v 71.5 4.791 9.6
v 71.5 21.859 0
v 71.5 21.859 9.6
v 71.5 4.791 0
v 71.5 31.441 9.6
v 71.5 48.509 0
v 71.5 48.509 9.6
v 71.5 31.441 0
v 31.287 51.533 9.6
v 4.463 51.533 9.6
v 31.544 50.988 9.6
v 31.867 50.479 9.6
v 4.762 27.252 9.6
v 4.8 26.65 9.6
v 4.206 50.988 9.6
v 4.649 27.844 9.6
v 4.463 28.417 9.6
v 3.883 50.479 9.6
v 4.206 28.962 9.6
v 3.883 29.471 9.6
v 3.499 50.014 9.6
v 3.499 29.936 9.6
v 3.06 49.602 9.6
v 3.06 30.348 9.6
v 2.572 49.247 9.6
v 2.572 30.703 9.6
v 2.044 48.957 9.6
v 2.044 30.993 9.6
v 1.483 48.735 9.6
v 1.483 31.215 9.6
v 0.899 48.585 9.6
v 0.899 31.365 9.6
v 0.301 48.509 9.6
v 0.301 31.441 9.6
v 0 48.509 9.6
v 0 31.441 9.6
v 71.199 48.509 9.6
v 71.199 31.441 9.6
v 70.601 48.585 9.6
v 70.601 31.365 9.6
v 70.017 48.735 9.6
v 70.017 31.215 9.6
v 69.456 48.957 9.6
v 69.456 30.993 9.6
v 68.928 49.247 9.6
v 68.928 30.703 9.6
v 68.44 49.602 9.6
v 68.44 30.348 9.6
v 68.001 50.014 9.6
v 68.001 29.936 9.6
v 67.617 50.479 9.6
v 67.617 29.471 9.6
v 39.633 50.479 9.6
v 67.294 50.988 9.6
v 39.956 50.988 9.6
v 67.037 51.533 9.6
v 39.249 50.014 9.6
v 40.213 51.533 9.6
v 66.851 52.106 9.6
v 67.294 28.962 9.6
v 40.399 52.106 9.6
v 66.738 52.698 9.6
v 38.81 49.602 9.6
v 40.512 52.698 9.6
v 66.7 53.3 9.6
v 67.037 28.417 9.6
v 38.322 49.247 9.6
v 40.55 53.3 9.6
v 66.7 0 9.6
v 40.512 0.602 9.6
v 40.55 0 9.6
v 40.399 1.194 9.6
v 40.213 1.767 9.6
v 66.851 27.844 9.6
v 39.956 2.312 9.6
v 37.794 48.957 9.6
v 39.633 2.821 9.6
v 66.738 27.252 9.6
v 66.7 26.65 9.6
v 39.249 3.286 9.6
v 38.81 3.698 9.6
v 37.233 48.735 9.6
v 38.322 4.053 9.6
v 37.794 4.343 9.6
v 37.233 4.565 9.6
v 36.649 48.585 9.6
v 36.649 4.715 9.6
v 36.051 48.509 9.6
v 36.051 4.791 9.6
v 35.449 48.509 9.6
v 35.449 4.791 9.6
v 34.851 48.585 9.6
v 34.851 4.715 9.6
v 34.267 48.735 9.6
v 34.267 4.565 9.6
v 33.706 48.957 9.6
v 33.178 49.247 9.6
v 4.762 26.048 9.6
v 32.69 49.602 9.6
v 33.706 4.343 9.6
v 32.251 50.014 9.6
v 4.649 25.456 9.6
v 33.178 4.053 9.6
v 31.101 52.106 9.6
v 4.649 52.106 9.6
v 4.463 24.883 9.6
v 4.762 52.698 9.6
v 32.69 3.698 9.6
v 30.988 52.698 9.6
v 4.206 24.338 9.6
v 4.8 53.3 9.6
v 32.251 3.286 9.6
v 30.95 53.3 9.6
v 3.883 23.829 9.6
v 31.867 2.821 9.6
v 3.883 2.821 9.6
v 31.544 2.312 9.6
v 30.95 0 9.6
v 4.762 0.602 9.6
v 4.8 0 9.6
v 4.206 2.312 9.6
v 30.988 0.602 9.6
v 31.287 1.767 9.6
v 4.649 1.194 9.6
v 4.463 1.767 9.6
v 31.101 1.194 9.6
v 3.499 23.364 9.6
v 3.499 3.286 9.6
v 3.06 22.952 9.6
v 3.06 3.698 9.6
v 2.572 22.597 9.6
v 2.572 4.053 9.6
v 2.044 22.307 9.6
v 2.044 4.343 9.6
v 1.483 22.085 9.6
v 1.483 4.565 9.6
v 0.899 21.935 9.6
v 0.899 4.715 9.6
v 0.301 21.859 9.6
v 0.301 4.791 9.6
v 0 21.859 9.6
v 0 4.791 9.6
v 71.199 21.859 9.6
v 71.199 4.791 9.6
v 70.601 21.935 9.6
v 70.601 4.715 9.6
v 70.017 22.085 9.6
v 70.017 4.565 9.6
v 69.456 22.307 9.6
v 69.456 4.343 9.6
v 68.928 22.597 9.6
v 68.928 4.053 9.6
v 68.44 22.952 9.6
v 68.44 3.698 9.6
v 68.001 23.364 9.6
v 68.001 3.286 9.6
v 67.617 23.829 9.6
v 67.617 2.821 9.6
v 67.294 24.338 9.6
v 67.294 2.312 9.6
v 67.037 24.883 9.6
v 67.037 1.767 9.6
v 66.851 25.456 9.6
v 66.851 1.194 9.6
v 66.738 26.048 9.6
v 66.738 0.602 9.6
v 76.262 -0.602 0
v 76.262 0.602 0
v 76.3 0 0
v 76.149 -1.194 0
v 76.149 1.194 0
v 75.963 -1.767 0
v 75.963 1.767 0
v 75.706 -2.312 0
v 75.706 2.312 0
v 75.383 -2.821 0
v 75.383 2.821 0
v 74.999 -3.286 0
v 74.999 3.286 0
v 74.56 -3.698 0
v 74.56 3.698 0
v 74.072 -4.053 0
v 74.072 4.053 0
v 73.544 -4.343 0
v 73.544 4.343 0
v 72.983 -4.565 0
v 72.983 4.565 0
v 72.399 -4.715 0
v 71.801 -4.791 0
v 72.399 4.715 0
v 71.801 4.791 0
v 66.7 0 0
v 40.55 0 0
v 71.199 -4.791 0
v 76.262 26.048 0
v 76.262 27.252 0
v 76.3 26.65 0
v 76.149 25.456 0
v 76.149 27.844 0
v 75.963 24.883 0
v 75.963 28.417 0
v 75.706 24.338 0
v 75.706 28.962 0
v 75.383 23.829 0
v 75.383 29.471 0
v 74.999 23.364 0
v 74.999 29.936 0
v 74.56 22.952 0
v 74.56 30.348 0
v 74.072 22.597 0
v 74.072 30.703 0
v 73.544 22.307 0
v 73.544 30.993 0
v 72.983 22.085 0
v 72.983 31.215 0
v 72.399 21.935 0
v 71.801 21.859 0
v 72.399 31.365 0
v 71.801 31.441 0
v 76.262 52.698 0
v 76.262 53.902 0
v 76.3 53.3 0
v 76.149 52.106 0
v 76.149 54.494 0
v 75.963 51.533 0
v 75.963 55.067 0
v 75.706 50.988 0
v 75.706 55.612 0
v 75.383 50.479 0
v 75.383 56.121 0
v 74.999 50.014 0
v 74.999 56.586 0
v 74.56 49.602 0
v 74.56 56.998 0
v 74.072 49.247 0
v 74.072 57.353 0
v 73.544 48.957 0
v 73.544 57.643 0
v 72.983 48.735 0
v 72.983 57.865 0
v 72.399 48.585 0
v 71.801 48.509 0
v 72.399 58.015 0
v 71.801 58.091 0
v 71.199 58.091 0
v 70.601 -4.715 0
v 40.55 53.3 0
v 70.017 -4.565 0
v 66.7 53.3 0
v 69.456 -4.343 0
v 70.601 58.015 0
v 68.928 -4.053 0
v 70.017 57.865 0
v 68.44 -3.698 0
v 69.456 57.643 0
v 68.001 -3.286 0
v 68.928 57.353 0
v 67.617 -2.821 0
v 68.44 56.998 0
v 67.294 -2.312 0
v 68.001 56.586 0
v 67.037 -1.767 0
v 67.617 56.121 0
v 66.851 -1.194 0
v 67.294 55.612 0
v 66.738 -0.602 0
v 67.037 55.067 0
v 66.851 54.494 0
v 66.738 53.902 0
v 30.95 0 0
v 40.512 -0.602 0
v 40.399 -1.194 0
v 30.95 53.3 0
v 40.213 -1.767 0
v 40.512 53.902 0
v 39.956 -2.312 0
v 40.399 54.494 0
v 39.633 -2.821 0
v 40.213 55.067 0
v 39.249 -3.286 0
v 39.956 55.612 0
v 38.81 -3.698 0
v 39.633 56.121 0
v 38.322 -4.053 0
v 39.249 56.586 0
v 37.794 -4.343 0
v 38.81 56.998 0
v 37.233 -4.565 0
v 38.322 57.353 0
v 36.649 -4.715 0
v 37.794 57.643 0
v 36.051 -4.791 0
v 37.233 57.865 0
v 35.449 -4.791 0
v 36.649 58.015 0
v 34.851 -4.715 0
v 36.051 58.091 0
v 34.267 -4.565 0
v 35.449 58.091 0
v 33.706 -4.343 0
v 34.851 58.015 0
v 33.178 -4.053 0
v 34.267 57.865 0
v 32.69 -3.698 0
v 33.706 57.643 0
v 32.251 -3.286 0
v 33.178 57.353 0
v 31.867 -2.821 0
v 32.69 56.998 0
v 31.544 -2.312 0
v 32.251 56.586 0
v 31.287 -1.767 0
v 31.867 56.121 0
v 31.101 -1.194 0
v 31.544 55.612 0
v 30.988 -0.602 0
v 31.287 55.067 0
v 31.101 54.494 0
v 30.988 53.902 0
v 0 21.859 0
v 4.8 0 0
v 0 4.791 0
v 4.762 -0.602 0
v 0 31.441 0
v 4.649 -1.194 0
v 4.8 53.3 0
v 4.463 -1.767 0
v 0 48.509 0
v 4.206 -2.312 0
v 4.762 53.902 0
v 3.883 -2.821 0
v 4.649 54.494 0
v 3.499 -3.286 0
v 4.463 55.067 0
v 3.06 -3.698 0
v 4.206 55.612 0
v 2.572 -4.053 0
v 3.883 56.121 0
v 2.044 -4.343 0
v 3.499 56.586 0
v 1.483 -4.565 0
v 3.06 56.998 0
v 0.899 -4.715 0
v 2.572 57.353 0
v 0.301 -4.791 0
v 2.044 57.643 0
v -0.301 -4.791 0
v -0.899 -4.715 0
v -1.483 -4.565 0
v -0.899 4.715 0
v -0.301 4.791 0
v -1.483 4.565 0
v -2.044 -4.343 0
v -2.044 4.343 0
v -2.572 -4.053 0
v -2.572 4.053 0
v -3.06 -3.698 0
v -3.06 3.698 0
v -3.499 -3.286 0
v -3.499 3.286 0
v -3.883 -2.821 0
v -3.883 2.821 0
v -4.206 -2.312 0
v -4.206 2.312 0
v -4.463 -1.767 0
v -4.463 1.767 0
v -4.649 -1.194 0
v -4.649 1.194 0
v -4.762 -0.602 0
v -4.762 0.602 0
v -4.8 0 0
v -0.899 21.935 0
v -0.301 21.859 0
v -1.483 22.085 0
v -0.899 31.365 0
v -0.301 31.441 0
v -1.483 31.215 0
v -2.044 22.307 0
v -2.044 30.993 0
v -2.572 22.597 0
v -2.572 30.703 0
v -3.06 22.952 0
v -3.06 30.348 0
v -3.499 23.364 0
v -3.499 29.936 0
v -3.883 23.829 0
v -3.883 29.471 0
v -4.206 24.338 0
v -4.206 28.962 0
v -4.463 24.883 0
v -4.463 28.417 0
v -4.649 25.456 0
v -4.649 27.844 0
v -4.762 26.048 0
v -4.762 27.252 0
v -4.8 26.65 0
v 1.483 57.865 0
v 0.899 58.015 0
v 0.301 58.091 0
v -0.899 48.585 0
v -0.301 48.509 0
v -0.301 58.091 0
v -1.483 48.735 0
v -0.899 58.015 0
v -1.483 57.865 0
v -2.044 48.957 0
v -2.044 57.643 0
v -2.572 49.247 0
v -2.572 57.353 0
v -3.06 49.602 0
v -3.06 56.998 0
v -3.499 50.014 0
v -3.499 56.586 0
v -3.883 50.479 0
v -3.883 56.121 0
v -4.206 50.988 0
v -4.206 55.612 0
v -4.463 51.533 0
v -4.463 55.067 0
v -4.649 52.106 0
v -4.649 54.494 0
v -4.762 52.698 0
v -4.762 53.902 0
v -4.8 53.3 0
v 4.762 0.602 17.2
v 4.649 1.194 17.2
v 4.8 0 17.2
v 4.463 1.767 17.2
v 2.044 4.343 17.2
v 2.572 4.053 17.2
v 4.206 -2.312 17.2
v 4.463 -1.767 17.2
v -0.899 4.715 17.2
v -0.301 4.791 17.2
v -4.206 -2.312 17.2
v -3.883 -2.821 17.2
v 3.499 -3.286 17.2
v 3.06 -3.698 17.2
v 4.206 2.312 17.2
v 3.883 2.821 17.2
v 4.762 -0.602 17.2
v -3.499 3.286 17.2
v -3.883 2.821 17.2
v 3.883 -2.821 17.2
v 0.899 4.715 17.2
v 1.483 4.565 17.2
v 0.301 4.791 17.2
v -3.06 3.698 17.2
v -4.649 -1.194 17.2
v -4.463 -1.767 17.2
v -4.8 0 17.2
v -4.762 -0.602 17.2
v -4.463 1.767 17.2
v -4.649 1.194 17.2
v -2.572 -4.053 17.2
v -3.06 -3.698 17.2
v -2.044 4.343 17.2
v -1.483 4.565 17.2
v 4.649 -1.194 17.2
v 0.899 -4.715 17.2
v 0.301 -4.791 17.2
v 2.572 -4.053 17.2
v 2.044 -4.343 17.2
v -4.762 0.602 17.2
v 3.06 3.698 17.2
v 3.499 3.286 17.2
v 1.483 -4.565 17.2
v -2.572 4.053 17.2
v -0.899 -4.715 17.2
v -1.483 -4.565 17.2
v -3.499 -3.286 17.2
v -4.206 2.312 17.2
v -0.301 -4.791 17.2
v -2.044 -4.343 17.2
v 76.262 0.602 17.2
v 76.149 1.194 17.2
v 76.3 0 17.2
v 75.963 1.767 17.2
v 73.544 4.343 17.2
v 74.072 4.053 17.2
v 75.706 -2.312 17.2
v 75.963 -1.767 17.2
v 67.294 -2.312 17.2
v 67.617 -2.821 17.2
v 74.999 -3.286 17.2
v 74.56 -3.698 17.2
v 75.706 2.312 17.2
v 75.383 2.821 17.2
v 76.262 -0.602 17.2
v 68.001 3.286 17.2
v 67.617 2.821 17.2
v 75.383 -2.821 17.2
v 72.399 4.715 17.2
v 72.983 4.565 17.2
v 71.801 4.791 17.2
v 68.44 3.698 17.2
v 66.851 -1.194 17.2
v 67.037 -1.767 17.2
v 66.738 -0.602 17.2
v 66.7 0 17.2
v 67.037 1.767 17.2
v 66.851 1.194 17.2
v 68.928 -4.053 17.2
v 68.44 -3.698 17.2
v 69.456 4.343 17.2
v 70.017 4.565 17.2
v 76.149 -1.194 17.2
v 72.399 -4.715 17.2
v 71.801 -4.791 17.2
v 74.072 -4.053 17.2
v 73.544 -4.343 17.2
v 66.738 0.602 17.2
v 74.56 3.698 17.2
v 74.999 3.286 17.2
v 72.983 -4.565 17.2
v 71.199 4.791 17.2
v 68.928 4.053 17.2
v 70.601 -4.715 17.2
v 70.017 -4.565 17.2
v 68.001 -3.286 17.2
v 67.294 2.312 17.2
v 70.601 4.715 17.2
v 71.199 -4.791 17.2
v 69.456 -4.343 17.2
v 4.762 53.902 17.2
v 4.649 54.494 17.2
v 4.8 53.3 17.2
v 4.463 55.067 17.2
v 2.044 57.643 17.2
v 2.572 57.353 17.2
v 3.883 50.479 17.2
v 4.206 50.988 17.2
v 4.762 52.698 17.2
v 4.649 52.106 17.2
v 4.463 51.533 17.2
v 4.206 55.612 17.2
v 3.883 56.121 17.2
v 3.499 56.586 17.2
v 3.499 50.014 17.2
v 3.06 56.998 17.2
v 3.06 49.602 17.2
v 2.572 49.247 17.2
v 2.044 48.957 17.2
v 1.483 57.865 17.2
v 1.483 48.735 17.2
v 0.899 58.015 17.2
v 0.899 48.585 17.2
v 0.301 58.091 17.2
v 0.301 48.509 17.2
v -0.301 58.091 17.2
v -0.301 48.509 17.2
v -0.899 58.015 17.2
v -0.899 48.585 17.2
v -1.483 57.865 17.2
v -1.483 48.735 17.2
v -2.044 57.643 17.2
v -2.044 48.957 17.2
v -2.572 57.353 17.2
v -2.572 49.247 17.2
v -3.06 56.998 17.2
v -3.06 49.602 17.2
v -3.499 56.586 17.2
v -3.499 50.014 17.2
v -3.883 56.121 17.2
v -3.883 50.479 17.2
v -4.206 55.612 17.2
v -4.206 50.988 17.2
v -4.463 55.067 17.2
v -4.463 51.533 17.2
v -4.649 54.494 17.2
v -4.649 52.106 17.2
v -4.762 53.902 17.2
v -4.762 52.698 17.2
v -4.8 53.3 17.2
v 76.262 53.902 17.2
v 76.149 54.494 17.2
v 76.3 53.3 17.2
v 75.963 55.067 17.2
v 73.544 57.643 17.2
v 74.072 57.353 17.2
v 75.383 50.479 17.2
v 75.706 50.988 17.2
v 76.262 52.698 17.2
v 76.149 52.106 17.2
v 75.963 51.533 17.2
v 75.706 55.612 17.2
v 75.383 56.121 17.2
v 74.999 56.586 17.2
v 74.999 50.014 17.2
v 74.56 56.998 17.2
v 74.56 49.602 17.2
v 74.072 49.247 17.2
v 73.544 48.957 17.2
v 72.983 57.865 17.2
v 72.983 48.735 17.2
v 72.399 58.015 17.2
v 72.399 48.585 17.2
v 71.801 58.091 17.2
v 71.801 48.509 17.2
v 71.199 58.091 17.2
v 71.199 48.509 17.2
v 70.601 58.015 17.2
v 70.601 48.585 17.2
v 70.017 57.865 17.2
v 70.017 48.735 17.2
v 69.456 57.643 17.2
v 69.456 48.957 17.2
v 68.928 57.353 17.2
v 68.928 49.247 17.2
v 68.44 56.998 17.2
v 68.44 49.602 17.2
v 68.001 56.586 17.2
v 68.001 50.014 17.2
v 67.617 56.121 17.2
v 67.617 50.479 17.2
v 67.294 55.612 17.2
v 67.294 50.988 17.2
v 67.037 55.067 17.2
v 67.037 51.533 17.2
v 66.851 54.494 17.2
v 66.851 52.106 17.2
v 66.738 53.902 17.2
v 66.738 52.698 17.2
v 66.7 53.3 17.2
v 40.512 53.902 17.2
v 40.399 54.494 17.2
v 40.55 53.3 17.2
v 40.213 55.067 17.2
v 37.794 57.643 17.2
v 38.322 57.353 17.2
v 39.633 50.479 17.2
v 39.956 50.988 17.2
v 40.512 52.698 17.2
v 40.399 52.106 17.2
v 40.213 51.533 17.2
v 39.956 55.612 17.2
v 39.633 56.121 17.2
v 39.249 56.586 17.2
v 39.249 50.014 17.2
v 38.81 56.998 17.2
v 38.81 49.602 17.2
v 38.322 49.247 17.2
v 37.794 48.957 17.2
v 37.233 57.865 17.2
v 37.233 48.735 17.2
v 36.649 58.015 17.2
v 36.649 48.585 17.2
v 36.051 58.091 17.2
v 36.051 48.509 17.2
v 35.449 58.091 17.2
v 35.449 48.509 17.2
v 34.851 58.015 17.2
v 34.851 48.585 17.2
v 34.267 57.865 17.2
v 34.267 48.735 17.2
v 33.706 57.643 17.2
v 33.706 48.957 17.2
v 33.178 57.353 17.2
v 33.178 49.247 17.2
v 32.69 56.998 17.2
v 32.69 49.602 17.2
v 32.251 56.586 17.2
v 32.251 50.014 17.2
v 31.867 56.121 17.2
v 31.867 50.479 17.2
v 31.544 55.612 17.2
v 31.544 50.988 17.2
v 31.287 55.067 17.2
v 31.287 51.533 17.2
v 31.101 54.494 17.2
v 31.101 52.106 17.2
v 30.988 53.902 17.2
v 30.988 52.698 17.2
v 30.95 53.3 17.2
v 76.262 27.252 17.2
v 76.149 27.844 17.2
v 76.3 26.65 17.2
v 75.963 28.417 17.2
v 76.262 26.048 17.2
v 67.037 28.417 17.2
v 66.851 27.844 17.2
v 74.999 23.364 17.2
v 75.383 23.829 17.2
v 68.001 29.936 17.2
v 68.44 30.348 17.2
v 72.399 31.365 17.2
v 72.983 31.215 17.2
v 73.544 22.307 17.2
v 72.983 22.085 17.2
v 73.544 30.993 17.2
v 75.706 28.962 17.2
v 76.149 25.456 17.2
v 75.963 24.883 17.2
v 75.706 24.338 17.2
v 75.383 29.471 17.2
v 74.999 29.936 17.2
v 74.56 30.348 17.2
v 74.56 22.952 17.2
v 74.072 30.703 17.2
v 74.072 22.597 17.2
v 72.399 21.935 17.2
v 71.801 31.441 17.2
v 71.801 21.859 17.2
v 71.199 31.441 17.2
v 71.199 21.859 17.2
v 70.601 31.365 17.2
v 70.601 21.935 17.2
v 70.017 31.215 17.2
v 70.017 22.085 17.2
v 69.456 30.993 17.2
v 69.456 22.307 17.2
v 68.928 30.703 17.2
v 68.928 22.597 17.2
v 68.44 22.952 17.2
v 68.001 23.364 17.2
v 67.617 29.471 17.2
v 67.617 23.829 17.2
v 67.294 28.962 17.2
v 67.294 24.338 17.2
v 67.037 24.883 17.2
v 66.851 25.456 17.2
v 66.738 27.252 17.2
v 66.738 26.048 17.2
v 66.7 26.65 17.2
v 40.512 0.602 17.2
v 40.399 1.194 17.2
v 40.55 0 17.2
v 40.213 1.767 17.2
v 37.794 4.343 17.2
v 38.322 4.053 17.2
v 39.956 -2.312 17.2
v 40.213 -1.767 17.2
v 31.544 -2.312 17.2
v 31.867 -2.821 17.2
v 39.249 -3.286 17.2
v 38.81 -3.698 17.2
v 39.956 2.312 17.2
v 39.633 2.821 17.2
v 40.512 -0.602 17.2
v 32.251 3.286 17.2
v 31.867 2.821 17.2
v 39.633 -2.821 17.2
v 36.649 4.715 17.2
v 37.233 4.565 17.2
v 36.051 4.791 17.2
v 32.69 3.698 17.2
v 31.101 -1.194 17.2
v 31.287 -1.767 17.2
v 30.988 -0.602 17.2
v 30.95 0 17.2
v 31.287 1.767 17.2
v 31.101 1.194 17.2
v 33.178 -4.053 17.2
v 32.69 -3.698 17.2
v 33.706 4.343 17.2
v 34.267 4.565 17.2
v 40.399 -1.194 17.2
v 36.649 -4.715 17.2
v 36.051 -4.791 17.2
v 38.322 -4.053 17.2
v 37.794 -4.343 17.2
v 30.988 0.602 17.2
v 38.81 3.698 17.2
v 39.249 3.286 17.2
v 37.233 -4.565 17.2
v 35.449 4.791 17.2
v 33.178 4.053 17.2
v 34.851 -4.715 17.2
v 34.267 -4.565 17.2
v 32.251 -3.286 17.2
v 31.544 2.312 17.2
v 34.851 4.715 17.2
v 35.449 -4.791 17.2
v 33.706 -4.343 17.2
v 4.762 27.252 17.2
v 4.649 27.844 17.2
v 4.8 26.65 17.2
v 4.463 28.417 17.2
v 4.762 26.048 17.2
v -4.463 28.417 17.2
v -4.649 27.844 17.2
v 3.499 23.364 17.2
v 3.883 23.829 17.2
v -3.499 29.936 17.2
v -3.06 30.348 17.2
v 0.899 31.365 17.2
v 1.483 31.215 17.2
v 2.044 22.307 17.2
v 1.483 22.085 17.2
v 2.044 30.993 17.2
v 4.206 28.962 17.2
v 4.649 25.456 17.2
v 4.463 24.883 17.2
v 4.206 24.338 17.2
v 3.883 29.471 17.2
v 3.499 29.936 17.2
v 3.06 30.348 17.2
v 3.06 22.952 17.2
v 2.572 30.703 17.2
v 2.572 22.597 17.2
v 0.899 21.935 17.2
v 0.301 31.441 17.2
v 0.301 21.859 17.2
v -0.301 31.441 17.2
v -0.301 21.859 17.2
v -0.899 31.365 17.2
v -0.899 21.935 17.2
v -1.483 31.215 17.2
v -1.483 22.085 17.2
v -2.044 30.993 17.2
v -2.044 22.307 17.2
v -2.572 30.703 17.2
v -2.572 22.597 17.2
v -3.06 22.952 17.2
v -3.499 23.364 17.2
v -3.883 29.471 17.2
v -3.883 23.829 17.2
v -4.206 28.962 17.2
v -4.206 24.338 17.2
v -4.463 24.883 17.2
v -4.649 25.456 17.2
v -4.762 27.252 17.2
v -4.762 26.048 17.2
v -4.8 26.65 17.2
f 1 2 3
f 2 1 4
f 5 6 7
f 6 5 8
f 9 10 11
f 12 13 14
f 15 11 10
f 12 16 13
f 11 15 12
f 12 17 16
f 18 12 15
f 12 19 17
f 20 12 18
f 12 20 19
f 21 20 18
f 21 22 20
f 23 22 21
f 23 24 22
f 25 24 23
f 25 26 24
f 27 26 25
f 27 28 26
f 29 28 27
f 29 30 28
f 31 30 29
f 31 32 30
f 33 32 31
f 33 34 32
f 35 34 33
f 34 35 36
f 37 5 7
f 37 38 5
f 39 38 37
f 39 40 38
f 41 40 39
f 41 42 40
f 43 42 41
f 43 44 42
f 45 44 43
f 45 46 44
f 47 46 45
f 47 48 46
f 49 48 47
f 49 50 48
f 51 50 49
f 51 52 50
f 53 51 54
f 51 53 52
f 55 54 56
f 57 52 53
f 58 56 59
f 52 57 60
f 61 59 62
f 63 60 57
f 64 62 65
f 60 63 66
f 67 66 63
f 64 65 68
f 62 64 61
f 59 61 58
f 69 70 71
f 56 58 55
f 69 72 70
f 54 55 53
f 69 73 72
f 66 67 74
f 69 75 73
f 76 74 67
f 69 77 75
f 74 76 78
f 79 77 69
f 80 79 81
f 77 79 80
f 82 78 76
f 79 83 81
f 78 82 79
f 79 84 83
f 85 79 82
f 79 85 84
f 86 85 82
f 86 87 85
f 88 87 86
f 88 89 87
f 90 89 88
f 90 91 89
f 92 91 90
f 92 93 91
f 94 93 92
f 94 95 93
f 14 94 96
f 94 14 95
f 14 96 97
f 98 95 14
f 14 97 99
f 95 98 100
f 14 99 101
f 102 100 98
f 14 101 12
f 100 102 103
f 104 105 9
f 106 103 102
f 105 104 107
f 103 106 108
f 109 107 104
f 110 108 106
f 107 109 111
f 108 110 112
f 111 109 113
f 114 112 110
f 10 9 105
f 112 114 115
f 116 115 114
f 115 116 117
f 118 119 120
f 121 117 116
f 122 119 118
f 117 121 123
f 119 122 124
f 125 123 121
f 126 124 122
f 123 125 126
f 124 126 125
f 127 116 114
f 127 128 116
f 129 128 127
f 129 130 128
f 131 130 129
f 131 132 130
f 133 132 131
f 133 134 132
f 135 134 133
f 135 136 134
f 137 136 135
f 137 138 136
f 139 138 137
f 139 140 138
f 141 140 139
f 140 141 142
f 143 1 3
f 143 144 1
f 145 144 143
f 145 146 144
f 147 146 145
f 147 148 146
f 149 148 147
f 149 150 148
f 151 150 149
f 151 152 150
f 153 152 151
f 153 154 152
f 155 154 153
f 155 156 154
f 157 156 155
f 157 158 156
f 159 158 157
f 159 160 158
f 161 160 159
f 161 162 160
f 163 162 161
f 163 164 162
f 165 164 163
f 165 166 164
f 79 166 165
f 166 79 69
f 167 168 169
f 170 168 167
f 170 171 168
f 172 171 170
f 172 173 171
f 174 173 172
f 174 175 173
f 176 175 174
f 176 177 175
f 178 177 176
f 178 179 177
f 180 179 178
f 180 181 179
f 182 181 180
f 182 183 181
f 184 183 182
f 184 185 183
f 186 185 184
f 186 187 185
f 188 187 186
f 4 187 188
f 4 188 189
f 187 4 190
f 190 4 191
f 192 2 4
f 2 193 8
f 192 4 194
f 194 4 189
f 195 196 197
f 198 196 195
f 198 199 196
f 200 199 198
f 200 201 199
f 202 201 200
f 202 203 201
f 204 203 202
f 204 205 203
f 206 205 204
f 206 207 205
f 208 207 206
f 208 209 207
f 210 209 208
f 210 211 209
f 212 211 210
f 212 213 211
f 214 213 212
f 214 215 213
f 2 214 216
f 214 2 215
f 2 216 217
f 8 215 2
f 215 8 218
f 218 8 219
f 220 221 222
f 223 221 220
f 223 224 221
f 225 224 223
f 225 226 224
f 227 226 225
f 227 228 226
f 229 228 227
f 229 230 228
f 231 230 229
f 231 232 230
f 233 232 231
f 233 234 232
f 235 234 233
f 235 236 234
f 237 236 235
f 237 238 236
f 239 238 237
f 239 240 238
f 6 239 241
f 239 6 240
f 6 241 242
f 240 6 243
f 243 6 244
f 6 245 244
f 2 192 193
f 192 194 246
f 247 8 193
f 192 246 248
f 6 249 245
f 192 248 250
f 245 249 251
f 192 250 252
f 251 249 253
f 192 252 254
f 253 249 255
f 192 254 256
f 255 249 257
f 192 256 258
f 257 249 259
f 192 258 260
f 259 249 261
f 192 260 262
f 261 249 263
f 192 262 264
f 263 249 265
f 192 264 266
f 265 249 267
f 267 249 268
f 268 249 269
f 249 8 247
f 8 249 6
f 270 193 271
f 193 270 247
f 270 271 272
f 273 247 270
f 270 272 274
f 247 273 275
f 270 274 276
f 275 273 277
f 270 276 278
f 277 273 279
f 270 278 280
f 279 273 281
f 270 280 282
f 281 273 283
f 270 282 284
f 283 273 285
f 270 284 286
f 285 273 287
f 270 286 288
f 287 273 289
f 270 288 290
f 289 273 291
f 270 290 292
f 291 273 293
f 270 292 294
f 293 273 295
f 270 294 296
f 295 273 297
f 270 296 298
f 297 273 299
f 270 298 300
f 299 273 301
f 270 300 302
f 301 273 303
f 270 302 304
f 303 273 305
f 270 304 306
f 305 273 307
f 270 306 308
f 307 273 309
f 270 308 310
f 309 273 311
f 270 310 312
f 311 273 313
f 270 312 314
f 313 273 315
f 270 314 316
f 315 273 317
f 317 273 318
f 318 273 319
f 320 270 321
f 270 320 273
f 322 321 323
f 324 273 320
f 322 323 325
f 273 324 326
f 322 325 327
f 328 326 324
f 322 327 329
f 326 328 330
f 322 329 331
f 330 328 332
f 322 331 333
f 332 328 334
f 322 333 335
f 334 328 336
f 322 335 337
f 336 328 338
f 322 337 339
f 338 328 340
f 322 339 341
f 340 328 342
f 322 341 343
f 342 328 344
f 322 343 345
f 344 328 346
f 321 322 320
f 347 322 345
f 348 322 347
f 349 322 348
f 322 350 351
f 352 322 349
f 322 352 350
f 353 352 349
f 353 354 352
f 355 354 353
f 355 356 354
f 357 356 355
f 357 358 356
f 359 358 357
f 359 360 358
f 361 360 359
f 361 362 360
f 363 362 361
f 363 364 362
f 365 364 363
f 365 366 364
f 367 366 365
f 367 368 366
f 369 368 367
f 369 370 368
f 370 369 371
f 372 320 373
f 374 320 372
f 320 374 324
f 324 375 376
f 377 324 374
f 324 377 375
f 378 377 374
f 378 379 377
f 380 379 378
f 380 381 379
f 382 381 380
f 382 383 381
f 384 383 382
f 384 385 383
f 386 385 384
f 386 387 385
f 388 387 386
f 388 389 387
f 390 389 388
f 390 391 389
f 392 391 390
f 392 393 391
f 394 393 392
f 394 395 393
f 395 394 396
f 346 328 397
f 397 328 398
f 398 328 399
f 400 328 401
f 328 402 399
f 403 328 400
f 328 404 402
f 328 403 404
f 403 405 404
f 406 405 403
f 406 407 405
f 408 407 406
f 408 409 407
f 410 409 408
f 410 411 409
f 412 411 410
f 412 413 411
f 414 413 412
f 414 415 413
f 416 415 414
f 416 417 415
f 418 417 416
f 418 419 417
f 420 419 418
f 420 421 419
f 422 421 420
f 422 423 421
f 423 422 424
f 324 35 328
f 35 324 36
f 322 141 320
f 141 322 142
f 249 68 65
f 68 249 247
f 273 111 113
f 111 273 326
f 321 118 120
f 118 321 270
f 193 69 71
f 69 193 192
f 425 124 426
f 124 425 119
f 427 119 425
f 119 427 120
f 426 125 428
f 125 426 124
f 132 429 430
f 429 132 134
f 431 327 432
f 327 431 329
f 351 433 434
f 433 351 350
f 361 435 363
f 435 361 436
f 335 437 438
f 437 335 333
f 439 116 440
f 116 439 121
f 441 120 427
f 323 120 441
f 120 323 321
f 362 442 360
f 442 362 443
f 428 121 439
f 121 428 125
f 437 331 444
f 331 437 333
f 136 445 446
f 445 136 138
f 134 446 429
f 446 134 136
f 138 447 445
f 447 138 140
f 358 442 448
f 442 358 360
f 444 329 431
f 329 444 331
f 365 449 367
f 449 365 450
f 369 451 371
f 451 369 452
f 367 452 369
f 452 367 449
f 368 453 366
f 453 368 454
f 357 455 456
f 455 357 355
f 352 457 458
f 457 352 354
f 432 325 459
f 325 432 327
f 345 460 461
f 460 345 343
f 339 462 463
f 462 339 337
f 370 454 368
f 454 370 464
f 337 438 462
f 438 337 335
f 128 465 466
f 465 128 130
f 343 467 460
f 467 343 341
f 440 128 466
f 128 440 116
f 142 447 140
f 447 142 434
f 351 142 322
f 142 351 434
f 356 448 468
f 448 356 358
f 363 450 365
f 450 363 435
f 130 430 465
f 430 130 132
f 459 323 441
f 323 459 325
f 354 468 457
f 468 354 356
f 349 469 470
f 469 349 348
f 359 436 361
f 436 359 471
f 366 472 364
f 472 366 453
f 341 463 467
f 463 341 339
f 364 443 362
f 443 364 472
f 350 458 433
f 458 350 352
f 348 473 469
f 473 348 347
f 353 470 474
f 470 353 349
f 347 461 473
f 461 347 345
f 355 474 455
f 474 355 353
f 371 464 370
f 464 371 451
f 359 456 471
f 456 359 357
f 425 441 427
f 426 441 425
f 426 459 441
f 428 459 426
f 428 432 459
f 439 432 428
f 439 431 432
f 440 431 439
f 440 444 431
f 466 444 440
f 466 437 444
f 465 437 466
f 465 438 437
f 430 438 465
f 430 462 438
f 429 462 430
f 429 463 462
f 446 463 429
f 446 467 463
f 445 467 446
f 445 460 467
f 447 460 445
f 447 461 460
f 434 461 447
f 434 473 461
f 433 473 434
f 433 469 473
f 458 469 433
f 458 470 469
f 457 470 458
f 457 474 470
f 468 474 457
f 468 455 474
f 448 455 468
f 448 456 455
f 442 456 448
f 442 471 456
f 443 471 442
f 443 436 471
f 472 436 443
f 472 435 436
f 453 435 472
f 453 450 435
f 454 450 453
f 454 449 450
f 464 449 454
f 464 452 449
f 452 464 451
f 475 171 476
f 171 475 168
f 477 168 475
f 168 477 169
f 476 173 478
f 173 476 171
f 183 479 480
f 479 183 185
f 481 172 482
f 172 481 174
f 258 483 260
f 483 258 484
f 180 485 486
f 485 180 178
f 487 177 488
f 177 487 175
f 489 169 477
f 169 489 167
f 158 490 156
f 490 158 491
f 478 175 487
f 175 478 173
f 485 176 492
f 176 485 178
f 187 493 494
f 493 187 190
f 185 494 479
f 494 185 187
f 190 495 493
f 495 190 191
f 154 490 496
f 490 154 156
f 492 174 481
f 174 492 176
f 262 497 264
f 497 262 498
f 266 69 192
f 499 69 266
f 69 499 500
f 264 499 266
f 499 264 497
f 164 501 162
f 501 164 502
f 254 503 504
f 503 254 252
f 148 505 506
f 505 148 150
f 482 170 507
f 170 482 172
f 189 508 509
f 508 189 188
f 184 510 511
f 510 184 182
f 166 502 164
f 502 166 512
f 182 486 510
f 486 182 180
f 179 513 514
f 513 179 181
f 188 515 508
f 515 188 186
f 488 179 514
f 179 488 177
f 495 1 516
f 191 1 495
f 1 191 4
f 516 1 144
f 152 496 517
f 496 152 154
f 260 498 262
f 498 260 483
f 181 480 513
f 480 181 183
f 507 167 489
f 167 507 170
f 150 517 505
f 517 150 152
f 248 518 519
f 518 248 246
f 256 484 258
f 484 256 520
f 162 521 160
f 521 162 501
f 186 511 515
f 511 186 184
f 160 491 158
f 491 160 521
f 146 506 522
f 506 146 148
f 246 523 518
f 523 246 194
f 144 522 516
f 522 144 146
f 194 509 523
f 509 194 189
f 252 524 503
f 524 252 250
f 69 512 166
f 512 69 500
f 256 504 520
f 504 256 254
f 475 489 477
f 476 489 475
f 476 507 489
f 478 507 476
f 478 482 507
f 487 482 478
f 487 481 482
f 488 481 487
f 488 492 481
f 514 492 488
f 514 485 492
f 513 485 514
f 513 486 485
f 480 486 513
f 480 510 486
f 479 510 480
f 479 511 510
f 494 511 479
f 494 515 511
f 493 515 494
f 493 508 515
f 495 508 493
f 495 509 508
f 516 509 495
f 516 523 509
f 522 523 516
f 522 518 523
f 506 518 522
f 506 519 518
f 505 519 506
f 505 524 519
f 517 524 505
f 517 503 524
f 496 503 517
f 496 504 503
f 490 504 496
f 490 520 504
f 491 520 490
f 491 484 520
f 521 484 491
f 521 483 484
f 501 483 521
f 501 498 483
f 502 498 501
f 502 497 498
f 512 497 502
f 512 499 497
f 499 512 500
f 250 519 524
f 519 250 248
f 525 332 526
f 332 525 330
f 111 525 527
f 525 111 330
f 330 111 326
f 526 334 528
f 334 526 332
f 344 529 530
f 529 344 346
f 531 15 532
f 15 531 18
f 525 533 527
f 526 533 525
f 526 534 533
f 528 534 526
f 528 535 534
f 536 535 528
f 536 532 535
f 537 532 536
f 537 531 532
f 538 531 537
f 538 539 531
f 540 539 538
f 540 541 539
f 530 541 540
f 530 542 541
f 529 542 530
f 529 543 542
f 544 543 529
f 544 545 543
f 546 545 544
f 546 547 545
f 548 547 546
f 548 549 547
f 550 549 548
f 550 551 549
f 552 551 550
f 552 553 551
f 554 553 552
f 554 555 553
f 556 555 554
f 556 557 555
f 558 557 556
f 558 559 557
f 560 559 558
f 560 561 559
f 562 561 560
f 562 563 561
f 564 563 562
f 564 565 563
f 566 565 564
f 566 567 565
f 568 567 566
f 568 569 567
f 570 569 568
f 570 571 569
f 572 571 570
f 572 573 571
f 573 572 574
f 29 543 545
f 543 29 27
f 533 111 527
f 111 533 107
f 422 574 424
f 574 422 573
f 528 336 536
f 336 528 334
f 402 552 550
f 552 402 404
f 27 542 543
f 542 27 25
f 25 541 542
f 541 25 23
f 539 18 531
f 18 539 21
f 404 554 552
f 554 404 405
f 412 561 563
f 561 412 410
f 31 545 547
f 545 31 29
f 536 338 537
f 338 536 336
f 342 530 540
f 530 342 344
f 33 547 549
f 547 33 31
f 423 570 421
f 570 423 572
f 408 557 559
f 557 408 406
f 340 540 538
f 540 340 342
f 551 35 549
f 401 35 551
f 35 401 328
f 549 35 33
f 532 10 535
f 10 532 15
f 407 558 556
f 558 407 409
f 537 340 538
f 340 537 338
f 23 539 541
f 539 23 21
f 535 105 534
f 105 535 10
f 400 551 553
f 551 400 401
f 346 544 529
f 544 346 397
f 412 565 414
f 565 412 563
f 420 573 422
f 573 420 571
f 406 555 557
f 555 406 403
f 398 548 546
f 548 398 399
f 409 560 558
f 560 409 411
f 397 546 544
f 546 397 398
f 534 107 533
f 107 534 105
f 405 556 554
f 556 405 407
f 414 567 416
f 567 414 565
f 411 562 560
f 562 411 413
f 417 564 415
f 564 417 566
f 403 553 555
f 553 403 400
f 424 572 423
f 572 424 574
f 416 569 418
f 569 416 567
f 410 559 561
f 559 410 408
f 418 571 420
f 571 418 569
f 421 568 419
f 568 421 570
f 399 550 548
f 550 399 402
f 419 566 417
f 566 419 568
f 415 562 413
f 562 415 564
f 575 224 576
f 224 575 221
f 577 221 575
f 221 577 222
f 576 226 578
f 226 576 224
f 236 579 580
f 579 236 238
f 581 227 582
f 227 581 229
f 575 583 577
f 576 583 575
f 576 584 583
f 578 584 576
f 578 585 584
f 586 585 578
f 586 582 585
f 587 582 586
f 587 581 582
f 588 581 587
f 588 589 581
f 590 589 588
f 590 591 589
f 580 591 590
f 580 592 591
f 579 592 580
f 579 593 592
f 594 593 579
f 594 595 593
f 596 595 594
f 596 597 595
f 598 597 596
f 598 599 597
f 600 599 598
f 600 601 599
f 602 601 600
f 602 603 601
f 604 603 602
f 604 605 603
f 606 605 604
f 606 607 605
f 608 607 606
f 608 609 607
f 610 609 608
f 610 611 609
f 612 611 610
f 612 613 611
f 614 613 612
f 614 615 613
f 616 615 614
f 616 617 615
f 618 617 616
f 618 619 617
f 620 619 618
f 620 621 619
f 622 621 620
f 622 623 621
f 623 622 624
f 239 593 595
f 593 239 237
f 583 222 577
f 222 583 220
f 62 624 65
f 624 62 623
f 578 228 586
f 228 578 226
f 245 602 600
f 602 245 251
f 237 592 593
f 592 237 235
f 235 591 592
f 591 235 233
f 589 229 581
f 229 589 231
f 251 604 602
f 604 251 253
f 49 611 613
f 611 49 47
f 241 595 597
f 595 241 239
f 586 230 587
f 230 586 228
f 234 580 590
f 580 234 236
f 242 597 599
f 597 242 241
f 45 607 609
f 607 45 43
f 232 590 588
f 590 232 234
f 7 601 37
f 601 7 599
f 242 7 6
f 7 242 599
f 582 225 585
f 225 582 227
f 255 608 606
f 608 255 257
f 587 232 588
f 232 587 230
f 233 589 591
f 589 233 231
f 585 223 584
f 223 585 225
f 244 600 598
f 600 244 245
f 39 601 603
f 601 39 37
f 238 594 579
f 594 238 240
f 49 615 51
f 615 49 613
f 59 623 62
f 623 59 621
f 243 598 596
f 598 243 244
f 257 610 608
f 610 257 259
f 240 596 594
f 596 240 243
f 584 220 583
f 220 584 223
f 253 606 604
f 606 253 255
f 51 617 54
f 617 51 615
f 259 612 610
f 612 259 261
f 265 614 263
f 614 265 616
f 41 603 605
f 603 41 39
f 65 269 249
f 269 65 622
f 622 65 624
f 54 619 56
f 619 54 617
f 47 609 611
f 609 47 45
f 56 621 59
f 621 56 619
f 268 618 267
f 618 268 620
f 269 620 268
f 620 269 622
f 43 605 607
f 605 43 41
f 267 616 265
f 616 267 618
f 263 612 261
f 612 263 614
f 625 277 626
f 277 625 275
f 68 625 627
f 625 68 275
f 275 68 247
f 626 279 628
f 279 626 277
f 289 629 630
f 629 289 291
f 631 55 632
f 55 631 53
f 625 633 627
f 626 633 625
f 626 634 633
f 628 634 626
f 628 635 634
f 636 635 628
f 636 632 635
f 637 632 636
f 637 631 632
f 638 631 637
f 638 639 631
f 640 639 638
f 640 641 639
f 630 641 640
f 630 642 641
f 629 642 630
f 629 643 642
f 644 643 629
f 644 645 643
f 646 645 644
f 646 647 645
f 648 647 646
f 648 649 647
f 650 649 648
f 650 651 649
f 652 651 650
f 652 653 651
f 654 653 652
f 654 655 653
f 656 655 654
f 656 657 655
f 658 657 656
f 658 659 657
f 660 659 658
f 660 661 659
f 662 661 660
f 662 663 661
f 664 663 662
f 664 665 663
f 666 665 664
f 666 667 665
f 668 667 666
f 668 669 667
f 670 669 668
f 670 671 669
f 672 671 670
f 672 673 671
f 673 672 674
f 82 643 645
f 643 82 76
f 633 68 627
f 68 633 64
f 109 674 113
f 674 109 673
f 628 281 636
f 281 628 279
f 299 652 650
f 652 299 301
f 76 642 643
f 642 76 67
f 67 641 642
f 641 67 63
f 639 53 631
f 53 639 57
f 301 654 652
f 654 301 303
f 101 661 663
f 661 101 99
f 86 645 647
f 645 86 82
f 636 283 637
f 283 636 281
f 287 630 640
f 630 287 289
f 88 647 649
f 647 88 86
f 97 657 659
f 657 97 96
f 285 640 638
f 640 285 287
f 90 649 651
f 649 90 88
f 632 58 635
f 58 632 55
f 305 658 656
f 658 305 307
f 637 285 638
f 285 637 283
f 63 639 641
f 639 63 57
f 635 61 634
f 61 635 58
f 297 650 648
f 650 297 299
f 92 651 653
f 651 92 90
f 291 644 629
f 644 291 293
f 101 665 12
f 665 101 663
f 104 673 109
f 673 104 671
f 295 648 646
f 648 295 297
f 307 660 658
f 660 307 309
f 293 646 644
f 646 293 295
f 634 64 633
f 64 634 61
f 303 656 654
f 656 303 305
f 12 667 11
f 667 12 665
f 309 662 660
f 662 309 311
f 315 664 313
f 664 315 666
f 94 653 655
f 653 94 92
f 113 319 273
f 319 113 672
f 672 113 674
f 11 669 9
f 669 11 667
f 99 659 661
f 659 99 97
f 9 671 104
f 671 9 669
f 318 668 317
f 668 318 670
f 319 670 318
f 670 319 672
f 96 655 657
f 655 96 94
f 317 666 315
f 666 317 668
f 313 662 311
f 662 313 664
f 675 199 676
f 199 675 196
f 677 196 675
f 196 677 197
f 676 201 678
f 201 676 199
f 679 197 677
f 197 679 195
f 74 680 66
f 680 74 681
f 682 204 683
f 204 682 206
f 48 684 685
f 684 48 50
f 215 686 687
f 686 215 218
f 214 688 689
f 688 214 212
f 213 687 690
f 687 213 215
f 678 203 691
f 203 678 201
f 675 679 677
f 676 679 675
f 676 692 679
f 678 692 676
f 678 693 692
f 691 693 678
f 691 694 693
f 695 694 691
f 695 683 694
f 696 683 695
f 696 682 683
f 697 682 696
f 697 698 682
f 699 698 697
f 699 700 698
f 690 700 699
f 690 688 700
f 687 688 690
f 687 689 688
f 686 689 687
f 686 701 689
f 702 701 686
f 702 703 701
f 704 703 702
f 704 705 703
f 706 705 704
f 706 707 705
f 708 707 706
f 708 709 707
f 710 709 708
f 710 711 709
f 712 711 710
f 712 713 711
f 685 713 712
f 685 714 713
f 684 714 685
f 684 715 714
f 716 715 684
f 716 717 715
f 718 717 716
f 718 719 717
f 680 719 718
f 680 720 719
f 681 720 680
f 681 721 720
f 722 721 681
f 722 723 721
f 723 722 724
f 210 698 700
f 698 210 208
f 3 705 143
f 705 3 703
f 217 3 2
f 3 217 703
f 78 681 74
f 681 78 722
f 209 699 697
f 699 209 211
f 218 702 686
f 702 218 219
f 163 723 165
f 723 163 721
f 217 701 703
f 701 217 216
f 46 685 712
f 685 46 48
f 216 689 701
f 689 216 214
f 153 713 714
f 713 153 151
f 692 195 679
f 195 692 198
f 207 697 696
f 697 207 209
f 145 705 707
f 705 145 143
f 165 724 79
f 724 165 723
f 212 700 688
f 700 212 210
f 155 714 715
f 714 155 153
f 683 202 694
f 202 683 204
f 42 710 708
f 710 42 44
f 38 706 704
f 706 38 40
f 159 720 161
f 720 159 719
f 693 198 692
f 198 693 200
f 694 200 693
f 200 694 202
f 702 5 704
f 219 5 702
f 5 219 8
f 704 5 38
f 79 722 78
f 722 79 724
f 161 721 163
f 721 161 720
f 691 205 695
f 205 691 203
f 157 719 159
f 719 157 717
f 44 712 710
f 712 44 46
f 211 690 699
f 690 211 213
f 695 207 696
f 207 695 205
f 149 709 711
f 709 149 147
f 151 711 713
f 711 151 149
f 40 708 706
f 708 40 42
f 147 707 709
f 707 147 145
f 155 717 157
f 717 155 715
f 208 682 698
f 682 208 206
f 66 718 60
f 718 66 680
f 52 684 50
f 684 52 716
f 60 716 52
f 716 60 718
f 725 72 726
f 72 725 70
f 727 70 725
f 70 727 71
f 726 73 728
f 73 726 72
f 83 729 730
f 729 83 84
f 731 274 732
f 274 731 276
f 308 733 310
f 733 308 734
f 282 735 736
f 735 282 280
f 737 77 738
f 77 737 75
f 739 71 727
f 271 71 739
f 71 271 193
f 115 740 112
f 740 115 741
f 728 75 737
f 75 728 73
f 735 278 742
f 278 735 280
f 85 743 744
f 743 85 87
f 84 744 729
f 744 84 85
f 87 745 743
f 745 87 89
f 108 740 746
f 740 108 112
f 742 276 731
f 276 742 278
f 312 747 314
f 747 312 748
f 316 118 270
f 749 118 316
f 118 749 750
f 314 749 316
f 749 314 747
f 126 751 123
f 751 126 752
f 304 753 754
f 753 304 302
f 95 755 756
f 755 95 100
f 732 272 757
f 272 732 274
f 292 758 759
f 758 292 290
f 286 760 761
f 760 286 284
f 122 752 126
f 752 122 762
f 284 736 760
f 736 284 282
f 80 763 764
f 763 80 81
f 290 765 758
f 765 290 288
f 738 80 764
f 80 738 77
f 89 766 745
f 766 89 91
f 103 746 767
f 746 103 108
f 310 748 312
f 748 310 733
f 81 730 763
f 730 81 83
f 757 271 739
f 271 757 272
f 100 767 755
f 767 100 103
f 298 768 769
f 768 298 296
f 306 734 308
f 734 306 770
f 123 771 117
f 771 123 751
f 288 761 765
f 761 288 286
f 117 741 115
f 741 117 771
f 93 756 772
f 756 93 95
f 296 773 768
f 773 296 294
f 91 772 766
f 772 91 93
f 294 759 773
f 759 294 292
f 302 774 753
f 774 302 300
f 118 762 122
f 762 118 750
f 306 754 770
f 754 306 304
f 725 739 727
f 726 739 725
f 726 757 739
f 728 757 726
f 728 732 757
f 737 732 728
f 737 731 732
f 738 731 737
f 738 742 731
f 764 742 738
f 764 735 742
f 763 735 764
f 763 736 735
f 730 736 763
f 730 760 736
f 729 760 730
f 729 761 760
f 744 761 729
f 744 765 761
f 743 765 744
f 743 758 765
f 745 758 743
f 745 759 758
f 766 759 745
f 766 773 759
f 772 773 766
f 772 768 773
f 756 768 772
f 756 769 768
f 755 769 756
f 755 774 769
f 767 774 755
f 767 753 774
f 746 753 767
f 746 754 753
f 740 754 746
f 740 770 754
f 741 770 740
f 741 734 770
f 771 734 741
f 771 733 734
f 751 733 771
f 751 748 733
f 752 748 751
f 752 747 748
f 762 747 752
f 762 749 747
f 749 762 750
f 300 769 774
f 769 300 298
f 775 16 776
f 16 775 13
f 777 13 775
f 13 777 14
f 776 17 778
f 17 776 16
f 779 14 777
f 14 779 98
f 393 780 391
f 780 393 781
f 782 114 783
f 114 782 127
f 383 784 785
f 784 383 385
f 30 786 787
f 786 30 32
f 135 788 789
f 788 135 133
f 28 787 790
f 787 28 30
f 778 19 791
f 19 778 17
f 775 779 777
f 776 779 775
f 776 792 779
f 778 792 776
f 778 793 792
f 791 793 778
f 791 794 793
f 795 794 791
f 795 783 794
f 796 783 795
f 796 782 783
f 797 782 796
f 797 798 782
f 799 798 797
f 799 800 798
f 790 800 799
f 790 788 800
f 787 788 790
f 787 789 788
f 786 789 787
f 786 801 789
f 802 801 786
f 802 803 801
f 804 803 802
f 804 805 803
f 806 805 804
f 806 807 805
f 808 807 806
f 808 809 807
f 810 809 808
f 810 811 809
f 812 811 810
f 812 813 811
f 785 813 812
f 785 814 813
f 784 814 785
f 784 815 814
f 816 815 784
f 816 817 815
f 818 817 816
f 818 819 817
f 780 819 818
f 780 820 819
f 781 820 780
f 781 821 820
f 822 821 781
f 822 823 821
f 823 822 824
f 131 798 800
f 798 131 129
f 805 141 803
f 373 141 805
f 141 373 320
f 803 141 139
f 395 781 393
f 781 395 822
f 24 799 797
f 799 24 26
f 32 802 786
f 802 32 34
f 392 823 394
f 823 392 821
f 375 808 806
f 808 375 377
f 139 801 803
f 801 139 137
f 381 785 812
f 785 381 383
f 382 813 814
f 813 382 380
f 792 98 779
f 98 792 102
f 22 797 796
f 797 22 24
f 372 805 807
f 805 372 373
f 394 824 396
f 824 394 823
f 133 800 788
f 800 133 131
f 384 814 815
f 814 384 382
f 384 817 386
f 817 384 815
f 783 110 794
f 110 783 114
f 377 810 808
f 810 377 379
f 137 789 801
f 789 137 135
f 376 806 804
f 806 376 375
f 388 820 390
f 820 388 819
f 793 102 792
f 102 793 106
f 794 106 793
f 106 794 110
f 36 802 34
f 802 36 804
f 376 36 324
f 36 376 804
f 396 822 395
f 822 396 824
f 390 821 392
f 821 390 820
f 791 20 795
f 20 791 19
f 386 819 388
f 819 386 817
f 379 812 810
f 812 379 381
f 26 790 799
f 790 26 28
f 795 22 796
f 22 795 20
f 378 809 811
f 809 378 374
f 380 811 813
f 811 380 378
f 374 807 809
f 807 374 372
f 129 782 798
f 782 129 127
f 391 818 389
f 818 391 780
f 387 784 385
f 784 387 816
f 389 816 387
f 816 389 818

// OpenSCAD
$fn = 50;

s = 1.3;

x = 55*s;
y = 41*s; 
z = 9.6;

ultra = 18*s;

cylHeight = 17.2;
cylRad = 9.6/2;

oddCylShift = ultra*sin(45);

module cyl(){
	cylinder(r=cylRad, h=cylHeight);
}

module mainPart() {
	union(){
		cube([x,y,z]);
		
		cyl();
		
		translate([x,0,0])
		cyl();
		
		translate([0,y,0])
		cyl();

		translate([x,y,0])
		cyl();
		
		translate([x/2,y,0])
		cyl();

		translate([x,y/2,0])
		cyl();

		translate([x/2,0,0])
		cyl();

		translate([0,y/2,0])
		cyl();
	}
}

mainPart();
